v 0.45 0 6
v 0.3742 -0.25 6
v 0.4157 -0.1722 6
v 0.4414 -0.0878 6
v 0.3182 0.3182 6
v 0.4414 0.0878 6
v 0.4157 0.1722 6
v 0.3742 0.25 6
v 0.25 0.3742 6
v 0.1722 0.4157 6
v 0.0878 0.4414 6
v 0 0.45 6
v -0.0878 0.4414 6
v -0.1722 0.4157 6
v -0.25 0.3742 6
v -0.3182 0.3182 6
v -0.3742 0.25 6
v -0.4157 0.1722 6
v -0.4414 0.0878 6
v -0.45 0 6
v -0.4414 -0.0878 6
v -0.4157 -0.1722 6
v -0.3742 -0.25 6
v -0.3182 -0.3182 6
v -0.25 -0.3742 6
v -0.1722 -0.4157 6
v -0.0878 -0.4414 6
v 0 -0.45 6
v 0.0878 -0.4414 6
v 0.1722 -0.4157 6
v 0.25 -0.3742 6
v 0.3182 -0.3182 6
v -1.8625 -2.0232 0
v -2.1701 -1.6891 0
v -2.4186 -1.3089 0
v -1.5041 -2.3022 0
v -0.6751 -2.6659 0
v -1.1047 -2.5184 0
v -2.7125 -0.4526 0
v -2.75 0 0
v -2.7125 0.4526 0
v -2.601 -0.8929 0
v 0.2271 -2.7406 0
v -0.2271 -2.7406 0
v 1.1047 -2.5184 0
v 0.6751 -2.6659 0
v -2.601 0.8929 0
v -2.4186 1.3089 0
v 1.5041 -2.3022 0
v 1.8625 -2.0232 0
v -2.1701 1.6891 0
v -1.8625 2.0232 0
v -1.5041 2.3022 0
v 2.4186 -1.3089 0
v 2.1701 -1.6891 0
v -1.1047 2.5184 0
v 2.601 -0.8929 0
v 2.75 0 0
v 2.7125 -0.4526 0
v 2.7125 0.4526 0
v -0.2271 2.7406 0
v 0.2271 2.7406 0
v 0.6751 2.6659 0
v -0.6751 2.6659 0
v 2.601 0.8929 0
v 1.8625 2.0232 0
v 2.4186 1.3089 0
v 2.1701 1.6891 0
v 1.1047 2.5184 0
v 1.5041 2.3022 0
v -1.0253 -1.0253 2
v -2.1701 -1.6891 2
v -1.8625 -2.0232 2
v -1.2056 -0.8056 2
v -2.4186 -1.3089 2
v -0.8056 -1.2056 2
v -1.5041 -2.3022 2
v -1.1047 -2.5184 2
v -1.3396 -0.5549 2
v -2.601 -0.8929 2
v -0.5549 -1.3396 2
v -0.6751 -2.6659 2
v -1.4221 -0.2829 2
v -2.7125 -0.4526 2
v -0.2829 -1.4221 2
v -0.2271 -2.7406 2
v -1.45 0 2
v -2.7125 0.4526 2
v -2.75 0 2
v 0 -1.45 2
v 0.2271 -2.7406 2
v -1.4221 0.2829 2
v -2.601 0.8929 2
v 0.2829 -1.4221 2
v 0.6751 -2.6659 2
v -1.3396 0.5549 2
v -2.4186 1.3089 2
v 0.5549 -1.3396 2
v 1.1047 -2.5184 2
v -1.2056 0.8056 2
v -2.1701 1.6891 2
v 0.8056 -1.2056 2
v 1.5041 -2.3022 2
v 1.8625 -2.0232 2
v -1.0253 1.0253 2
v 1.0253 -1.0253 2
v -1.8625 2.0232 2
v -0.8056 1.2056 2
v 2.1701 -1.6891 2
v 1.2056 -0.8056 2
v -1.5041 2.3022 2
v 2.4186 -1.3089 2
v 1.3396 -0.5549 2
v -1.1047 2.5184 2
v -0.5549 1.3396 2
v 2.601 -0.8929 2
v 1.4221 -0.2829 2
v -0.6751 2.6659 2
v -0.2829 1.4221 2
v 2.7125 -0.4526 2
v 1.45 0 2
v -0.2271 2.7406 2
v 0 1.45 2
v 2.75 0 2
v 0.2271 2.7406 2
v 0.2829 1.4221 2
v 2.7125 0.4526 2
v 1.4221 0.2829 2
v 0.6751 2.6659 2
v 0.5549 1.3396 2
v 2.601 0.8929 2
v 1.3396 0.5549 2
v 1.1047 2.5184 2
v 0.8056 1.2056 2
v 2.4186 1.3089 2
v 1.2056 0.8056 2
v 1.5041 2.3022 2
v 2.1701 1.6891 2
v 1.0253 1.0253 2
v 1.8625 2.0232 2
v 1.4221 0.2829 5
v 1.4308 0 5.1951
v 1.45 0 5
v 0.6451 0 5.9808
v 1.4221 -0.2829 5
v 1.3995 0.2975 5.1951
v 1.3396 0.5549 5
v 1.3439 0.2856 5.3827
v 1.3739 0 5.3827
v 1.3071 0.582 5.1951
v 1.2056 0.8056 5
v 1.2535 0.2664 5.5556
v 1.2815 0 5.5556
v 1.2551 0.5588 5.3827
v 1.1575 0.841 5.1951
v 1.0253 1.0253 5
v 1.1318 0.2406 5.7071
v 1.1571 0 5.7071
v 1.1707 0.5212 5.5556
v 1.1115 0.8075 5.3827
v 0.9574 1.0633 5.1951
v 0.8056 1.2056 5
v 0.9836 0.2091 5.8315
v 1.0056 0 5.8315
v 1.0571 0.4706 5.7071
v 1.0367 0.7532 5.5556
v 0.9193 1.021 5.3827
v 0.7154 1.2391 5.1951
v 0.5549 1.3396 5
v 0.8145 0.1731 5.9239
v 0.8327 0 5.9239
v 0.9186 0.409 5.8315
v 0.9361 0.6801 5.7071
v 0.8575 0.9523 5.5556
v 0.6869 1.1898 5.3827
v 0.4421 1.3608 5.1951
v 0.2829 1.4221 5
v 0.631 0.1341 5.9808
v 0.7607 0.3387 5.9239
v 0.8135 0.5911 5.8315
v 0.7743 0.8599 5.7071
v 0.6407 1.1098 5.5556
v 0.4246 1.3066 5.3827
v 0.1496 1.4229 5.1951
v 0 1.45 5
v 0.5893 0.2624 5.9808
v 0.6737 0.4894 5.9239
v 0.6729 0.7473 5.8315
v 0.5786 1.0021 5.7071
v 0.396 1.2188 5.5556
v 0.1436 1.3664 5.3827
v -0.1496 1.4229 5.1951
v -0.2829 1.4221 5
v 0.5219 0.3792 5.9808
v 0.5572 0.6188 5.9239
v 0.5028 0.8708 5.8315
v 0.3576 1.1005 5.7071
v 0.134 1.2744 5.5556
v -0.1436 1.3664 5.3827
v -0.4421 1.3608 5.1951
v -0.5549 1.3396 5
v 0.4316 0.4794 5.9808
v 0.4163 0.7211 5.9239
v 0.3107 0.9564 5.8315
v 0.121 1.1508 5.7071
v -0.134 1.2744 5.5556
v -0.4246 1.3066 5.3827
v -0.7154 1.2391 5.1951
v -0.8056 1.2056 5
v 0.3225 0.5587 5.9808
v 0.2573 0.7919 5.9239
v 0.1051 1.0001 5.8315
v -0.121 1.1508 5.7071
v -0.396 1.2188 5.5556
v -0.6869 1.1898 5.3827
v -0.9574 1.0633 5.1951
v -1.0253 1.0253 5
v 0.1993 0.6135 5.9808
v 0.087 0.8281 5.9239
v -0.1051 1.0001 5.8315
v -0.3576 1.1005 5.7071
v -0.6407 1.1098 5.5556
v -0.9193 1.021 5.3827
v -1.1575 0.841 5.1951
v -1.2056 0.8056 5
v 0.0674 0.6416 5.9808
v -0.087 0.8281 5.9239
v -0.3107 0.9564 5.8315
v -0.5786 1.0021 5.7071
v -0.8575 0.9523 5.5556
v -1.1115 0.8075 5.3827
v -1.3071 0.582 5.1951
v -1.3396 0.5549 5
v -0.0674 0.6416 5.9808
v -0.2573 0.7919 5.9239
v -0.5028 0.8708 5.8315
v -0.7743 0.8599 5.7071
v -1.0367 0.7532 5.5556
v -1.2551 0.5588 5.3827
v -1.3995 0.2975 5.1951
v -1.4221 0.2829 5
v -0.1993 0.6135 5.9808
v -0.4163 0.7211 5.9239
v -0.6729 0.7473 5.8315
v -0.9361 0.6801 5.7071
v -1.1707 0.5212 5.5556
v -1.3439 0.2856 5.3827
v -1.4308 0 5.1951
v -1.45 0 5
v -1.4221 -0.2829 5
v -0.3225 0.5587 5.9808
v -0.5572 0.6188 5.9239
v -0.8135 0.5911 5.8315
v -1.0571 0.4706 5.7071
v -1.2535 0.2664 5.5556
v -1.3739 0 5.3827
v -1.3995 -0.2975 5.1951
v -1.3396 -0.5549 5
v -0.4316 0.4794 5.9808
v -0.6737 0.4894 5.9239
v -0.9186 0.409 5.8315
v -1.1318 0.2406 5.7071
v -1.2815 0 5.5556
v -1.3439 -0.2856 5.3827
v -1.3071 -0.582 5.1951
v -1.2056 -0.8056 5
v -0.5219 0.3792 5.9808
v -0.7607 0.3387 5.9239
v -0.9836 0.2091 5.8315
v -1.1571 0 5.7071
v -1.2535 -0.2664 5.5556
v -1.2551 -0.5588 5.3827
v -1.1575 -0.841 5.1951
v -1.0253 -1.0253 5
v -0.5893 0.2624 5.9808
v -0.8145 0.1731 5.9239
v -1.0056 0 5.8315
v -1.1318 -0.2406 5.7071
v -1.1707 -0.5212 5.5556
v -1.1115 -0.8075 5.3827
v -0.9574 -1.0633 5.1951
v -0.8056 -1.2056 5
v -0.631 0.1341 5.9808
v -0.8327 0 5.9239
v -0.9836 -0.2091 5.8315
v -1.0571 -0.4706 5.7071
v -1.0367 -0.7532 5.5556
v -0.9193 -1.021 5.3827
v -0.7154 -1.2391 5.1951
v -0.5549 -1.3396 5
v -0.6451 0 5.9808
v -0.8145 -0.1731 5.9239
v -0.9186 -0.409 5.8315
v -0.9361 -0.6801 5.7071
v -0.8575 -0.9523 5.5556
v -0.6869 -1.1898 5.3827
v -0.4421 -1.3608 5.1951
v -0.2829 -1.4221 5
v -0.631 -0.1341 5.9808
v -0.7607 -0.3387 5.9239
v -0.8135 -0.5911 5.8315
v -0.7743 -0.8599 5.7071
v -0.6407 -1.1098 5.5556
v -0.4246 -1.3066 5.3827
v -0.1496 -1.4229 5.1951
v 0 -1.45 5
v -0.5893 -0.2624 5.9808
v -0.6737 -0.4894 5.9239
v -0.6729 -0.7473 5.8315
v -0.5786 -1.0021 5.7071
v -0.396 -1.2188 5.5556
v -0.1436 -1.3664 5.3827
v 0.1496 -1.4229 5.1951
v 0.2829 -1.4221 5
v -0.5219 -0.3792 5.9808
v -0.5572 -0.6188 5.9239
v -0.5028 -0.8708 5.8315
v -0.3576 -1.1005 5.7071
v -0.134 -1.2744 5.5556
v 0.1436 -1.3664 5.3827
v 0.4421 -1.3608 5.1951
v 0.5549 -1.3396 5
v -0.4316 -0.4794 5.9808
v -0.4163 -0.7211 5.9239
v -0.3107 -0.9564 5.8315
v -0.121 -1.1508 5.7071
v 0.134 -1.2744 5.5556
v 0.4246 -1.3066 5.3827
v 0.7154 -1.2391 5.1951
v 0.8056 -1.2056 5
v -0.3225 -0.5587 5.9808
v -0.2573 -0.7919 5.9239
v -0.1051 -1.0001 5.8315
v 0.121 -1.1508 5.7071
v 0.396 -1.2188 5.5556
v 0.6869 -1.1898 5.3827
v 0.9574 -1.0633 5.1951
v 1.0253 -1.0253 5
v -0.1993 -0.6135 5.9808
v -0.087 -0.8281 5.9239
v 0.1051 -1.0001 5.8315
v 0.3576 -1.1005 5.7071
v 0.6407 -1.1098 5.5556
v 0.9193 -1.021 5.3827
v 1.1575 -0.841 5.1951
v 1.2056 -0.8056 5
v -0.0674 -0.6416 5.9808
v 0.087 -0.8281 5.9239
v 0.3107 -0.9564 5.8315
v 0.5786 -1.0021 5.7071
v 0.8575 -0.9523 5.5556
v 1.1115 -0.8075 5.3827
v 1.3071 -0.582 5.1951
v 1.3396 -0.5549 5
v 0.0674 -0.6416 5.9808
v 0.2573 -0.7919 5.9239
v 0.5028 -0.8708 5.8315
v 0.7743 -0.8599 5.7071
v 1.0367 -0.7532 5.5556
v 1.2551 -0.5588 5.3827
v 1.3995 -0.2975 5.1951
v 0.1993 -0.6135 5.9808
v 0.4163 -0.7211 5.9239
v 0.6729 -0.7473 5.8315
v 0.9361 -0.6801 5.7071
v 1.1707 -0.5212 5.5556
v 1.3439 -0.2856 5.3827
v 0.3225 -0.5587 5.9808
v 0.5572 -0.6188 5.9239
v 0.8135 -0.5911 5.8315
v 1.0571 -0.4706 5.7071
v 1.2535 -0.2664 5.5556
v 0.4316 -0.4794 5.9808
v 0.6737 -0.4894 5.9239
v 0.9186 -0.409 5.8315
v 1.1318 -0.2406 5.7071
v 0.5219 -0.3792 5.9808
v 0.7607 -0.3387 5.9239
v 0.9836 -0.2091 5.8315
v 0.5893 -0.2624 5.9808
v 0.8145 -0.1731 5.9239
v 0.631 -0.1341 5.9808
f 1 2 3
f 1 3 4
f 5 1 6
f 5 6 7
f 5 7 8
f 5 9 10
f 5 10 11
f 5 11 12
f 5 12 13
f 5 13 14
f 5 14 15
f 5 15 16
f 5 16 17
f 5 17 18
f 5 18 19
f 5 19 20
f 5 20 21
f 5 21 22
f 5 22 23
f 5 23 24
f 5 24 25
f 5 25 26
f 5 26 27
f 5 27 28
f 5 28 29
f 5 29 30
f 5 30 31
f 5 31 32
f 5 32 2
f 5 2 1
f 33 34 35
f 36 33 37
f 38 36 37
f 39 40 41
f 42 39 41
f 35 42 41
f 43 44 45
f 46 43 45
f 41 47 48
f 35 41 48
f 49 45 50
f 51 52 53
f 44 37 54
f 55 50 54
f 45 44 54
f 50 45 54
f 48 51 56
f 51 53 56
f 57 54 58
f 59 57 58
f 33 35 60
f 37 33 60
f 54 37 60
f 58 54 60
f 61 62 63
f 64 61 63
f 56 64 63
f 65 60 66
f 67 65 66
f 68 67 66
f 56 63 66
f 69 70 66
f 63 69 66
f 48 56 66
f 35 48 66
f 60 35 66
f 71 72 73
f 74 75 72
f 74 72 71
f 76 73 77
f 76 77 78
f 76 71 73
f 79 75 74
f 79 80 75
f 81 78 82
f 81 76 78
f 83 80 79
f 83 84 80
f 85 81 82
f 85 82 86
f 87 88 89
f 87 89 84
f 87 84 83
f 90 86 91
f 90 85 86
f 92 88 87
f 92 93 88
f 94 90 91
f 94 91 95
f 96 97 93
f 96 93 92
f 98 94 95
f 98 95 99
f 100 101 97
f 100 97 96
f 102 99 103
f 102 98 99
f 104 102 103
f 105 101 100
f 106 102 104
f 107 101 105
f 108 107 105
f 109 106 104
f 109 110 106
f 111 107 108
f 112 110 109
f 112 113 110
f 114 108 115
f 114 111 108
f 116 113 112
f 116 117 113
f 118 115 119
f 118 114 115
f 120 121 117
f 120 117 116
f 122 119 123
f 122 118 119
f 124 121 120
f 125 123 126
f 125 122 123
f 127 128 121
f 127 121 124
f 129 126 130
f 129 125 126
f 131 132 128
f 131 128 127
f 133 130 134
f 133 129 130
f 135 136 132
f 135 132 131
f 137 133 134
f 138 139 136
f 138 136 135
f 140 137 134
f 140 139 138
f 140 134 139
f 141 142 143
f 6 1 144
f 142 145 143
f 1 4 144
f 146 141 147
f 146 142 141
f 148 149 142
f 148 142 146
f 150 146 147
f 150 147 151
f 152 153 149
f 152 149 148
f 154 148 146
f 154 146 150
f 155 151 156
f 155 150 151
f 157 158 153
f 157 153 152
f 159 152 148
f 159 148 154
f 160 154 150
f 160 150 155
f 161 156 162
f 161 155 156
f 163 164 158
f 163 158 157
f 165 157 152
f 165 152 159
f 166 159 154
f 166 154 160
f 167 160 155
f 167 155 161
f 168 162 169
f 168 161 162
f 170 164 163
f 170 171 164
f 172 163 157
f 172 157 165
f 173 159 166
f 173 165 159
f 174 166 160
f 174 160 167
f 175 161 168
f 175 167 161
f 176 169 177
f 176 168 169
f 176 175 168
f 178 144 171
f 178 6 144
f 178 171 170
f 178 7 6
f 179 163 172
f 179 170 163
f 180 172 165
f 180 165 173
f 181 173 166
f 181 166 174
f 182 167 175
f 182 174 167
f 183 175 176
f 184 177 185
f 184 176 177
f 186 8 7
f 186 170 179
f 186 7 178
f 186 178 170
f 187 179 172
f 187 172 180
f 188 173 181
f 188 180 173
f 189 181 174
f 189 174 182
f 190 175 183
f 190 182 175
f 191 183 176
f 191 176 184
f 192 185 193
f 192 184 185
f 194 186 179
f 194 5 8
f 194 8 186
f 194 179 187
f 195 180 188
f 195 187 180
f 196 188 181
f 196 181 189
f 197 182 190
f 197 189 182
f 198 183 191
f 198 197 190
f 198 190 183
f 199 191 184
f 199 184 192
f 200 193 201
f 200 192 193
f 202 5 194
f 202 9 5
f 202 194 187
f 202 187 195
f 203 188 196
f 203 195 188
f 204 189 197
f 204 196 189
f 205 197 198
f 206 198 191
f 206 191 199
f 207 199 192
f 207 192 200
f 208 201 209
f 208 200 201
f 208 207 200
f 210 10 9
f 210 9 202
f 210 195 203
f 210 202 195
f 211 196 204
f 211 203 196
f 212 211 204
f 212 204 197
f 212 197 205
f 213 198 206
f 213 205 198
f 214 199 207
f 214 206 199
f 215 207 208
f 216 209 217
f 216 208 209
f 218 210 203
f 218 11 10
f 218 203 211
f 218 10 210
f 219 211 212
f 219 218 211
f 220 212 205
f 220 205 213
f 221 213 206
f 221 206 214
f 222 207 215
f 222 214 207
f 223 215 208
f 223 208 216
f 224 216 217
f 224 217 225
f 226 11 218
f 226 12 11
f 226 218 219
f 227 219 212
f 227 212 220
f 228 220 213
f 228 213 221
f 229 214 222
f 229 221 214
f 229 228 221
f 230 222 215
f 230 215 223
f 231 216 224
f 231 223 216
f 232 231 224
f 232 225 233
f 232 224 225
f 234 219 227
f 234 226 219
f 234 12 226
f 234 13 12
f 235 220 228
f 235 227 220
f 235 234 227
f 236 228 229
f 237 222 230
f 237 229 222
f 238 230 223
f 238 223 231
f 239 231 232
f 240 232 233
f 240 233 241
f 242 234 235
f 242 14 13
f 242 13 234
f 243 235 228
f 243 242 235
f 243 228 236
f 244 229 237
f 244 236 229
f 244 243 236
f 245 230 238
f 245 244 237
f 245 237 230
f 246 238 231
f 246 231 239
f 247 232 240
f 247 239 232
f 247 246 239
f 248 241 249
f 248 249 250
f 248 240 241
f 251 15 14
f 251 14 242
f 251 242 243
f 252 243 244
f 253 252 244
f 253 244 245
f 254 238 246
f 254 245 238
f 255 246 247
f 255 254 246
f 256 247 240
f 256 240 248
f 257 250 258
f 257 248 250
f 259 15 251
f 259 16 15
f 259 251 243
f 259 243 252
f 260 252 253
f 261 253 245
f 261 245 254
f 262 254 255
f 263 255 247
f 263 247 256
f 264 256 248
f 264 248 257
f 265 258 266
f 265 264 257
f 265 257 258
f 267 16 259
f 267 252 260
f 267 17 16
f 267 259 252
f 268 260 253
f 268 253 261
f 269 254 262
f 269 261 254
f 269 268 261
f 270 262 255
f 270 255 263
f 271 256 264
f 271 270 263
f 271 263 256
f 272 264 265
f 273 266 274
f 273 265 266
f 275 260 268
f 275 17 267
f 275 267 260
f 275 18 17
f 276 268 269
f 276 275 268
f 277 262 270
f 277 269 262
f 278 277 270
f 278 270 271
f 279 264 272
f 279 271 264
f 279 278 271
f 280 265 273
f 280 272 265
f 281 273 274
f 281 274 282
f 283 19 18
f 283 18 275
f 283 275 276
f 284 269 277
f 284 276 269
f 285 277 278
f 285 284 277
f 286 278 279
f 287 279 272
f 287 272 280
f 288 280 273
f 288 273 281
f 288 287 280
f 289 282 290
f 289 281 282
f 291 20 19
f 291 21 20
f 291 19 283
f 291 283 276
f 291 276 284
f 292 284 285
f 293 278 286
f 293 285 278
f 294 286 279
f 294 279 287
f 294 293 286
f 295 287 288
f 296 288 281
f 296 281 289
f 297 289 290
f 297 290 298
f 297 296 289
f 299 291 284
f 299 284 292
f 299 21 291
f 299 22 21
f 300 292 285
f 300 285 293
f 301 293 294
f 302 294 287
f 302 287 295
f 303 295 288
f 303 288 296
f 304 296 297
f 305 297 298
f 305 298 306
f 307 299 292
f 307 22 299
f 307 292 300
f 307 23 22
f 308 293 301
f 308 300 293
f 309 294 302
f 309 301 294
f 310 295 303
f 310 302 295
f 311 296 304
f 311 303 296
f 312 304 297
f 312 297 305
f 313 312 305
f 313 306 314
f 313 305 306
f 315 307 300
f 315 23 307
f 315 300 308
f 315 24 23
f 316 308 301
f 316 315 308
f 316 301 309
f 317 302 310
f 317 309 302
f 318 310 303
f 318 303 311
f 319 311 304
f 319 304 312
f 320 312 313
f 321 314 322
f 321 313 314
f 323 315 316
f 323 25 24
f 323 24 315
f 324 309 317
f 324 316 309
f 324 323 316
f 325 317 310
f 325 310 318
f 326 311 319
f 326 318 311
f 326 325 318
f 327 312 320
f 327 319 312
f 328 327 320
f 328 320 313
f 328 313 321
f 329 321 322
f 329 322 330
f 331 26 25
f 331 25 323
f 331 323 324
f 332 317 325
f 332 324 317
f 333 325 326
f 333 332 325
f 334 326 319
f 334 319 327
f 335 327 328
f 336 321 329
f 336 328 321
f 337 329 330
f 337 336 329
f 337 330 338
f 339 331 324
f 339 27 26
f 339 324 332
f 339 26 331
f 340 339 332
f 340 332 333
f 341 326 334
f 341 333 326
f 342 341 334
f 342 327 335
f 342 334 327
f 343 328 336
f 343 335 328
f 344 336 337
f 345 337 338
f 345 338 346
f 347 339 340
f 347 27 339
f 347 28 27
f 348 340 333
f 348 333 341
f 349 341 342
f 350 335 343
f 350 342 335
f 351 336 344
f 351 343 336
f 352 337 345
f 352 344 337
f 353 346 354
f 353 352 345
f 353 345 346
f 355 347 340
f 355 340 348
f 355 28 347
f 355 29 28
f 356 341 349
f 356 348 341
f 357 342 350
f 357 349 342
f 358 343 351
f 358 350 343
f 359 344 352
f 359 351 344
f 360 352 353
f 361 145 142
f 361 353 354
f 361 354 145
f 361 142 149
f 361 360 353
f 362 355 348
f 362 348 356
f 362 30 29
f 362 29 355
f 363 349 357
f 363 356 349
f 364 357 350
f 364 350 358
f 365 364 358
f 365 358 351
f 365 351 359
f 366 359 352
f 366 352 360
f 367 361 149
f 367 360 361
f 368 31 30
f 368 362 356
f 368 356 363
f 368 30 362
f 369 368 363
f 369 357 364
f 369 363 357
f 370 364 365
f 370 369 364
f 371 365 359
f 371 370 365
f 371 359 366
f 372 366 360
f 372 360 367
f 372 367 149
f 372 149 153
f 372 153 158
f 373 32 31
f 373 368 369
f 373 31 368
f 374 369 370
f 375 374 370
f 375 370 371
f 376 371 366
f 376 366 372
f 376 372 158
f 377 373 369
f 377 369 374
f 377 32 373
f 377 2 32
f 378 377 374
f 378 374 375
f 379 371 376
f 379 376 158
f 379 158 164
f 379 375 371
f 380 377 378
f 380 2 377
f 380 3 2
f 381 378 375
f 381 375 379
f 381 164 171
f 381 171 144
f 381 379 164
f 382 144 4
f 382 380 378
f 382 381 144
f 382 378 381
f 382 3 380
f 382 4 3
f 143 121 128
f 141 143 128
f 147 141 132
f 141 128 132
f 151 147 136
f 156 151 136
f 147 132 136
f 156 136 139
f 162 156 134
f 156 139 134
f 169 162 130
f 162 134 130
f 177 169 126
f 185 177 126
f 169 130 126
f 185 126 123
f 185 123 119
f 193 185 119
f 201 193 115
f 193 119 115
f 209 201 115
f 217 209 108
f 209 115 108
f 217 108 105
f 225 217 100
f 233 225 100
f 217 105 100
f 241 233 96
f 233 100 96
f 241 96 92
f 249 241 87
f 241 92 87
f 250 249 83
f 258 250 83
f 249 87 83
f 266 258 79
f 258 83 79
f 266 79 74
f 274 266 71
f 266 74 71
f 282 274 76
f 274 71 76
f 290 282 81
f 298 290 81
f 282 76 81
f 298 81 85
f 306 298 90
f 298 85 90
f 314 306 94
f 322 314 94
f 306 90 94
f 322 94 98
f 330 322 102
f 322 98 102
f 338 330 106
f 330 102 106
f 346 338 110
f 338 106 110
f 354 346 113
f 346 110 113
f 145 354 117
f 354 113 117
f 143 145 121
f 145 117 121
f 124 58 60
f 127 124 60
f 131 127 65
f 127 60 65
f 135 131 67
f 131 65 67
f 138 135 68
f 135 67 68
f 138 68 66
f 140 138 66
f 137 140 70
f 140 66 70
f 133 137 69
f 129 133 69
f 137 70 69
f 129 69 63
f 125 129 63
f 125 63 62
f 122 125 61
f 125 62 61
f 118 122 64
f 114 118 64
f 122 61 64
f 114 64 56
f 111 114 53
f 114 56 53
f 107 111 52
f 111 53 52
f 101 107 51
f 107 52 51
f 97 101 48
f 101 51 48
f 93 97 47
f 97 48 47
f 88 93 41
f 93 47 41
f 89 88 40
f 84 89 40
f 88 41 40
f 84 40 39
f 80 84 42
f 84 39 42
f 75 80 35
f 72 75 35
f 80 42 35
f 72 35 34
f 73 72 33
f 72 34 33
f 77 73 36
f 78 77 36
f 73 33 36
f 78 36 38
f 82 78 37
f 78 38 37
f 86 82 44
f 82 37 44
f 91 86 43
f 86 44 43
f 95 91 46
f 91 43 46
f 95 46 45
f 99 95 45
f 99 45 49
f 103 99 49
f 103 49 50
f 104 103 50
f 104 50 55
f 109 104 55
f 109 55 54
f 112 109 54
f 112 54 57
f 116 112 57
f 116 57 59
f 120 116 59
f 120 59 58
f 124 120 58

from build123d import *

# Parameters (mm, degrees)
SKETCH_R     = 2.75
PAD_DEPTH    = 2
SKETCH001_R  = 1.45
PAD001_DEPTH = 4
FILLET_R     = 1


with BuildPart() as part:
    # Sketch → Pad (new body)
    with BuildSketch(Plane.XY):
        Circle(SKETCH_R)
    extrude(amount=PAD_DEPTH)

    # Sketch001 (on Face3 of Pad) → Pad001 (join)
    with BuildSketch(Plane.XY.offset(2)):
        Circle(SKETCH001_R)
    extrude(amount=PAD001_DEPTH)

    # Fillet
    fillet_edges = [part.edges().sort_by_distance(p)[0] for p in [
        (-1.45, 0, 6),
    ]]
    fillet(fillet_edges, radius=FILLET_R)


solid = part.part
